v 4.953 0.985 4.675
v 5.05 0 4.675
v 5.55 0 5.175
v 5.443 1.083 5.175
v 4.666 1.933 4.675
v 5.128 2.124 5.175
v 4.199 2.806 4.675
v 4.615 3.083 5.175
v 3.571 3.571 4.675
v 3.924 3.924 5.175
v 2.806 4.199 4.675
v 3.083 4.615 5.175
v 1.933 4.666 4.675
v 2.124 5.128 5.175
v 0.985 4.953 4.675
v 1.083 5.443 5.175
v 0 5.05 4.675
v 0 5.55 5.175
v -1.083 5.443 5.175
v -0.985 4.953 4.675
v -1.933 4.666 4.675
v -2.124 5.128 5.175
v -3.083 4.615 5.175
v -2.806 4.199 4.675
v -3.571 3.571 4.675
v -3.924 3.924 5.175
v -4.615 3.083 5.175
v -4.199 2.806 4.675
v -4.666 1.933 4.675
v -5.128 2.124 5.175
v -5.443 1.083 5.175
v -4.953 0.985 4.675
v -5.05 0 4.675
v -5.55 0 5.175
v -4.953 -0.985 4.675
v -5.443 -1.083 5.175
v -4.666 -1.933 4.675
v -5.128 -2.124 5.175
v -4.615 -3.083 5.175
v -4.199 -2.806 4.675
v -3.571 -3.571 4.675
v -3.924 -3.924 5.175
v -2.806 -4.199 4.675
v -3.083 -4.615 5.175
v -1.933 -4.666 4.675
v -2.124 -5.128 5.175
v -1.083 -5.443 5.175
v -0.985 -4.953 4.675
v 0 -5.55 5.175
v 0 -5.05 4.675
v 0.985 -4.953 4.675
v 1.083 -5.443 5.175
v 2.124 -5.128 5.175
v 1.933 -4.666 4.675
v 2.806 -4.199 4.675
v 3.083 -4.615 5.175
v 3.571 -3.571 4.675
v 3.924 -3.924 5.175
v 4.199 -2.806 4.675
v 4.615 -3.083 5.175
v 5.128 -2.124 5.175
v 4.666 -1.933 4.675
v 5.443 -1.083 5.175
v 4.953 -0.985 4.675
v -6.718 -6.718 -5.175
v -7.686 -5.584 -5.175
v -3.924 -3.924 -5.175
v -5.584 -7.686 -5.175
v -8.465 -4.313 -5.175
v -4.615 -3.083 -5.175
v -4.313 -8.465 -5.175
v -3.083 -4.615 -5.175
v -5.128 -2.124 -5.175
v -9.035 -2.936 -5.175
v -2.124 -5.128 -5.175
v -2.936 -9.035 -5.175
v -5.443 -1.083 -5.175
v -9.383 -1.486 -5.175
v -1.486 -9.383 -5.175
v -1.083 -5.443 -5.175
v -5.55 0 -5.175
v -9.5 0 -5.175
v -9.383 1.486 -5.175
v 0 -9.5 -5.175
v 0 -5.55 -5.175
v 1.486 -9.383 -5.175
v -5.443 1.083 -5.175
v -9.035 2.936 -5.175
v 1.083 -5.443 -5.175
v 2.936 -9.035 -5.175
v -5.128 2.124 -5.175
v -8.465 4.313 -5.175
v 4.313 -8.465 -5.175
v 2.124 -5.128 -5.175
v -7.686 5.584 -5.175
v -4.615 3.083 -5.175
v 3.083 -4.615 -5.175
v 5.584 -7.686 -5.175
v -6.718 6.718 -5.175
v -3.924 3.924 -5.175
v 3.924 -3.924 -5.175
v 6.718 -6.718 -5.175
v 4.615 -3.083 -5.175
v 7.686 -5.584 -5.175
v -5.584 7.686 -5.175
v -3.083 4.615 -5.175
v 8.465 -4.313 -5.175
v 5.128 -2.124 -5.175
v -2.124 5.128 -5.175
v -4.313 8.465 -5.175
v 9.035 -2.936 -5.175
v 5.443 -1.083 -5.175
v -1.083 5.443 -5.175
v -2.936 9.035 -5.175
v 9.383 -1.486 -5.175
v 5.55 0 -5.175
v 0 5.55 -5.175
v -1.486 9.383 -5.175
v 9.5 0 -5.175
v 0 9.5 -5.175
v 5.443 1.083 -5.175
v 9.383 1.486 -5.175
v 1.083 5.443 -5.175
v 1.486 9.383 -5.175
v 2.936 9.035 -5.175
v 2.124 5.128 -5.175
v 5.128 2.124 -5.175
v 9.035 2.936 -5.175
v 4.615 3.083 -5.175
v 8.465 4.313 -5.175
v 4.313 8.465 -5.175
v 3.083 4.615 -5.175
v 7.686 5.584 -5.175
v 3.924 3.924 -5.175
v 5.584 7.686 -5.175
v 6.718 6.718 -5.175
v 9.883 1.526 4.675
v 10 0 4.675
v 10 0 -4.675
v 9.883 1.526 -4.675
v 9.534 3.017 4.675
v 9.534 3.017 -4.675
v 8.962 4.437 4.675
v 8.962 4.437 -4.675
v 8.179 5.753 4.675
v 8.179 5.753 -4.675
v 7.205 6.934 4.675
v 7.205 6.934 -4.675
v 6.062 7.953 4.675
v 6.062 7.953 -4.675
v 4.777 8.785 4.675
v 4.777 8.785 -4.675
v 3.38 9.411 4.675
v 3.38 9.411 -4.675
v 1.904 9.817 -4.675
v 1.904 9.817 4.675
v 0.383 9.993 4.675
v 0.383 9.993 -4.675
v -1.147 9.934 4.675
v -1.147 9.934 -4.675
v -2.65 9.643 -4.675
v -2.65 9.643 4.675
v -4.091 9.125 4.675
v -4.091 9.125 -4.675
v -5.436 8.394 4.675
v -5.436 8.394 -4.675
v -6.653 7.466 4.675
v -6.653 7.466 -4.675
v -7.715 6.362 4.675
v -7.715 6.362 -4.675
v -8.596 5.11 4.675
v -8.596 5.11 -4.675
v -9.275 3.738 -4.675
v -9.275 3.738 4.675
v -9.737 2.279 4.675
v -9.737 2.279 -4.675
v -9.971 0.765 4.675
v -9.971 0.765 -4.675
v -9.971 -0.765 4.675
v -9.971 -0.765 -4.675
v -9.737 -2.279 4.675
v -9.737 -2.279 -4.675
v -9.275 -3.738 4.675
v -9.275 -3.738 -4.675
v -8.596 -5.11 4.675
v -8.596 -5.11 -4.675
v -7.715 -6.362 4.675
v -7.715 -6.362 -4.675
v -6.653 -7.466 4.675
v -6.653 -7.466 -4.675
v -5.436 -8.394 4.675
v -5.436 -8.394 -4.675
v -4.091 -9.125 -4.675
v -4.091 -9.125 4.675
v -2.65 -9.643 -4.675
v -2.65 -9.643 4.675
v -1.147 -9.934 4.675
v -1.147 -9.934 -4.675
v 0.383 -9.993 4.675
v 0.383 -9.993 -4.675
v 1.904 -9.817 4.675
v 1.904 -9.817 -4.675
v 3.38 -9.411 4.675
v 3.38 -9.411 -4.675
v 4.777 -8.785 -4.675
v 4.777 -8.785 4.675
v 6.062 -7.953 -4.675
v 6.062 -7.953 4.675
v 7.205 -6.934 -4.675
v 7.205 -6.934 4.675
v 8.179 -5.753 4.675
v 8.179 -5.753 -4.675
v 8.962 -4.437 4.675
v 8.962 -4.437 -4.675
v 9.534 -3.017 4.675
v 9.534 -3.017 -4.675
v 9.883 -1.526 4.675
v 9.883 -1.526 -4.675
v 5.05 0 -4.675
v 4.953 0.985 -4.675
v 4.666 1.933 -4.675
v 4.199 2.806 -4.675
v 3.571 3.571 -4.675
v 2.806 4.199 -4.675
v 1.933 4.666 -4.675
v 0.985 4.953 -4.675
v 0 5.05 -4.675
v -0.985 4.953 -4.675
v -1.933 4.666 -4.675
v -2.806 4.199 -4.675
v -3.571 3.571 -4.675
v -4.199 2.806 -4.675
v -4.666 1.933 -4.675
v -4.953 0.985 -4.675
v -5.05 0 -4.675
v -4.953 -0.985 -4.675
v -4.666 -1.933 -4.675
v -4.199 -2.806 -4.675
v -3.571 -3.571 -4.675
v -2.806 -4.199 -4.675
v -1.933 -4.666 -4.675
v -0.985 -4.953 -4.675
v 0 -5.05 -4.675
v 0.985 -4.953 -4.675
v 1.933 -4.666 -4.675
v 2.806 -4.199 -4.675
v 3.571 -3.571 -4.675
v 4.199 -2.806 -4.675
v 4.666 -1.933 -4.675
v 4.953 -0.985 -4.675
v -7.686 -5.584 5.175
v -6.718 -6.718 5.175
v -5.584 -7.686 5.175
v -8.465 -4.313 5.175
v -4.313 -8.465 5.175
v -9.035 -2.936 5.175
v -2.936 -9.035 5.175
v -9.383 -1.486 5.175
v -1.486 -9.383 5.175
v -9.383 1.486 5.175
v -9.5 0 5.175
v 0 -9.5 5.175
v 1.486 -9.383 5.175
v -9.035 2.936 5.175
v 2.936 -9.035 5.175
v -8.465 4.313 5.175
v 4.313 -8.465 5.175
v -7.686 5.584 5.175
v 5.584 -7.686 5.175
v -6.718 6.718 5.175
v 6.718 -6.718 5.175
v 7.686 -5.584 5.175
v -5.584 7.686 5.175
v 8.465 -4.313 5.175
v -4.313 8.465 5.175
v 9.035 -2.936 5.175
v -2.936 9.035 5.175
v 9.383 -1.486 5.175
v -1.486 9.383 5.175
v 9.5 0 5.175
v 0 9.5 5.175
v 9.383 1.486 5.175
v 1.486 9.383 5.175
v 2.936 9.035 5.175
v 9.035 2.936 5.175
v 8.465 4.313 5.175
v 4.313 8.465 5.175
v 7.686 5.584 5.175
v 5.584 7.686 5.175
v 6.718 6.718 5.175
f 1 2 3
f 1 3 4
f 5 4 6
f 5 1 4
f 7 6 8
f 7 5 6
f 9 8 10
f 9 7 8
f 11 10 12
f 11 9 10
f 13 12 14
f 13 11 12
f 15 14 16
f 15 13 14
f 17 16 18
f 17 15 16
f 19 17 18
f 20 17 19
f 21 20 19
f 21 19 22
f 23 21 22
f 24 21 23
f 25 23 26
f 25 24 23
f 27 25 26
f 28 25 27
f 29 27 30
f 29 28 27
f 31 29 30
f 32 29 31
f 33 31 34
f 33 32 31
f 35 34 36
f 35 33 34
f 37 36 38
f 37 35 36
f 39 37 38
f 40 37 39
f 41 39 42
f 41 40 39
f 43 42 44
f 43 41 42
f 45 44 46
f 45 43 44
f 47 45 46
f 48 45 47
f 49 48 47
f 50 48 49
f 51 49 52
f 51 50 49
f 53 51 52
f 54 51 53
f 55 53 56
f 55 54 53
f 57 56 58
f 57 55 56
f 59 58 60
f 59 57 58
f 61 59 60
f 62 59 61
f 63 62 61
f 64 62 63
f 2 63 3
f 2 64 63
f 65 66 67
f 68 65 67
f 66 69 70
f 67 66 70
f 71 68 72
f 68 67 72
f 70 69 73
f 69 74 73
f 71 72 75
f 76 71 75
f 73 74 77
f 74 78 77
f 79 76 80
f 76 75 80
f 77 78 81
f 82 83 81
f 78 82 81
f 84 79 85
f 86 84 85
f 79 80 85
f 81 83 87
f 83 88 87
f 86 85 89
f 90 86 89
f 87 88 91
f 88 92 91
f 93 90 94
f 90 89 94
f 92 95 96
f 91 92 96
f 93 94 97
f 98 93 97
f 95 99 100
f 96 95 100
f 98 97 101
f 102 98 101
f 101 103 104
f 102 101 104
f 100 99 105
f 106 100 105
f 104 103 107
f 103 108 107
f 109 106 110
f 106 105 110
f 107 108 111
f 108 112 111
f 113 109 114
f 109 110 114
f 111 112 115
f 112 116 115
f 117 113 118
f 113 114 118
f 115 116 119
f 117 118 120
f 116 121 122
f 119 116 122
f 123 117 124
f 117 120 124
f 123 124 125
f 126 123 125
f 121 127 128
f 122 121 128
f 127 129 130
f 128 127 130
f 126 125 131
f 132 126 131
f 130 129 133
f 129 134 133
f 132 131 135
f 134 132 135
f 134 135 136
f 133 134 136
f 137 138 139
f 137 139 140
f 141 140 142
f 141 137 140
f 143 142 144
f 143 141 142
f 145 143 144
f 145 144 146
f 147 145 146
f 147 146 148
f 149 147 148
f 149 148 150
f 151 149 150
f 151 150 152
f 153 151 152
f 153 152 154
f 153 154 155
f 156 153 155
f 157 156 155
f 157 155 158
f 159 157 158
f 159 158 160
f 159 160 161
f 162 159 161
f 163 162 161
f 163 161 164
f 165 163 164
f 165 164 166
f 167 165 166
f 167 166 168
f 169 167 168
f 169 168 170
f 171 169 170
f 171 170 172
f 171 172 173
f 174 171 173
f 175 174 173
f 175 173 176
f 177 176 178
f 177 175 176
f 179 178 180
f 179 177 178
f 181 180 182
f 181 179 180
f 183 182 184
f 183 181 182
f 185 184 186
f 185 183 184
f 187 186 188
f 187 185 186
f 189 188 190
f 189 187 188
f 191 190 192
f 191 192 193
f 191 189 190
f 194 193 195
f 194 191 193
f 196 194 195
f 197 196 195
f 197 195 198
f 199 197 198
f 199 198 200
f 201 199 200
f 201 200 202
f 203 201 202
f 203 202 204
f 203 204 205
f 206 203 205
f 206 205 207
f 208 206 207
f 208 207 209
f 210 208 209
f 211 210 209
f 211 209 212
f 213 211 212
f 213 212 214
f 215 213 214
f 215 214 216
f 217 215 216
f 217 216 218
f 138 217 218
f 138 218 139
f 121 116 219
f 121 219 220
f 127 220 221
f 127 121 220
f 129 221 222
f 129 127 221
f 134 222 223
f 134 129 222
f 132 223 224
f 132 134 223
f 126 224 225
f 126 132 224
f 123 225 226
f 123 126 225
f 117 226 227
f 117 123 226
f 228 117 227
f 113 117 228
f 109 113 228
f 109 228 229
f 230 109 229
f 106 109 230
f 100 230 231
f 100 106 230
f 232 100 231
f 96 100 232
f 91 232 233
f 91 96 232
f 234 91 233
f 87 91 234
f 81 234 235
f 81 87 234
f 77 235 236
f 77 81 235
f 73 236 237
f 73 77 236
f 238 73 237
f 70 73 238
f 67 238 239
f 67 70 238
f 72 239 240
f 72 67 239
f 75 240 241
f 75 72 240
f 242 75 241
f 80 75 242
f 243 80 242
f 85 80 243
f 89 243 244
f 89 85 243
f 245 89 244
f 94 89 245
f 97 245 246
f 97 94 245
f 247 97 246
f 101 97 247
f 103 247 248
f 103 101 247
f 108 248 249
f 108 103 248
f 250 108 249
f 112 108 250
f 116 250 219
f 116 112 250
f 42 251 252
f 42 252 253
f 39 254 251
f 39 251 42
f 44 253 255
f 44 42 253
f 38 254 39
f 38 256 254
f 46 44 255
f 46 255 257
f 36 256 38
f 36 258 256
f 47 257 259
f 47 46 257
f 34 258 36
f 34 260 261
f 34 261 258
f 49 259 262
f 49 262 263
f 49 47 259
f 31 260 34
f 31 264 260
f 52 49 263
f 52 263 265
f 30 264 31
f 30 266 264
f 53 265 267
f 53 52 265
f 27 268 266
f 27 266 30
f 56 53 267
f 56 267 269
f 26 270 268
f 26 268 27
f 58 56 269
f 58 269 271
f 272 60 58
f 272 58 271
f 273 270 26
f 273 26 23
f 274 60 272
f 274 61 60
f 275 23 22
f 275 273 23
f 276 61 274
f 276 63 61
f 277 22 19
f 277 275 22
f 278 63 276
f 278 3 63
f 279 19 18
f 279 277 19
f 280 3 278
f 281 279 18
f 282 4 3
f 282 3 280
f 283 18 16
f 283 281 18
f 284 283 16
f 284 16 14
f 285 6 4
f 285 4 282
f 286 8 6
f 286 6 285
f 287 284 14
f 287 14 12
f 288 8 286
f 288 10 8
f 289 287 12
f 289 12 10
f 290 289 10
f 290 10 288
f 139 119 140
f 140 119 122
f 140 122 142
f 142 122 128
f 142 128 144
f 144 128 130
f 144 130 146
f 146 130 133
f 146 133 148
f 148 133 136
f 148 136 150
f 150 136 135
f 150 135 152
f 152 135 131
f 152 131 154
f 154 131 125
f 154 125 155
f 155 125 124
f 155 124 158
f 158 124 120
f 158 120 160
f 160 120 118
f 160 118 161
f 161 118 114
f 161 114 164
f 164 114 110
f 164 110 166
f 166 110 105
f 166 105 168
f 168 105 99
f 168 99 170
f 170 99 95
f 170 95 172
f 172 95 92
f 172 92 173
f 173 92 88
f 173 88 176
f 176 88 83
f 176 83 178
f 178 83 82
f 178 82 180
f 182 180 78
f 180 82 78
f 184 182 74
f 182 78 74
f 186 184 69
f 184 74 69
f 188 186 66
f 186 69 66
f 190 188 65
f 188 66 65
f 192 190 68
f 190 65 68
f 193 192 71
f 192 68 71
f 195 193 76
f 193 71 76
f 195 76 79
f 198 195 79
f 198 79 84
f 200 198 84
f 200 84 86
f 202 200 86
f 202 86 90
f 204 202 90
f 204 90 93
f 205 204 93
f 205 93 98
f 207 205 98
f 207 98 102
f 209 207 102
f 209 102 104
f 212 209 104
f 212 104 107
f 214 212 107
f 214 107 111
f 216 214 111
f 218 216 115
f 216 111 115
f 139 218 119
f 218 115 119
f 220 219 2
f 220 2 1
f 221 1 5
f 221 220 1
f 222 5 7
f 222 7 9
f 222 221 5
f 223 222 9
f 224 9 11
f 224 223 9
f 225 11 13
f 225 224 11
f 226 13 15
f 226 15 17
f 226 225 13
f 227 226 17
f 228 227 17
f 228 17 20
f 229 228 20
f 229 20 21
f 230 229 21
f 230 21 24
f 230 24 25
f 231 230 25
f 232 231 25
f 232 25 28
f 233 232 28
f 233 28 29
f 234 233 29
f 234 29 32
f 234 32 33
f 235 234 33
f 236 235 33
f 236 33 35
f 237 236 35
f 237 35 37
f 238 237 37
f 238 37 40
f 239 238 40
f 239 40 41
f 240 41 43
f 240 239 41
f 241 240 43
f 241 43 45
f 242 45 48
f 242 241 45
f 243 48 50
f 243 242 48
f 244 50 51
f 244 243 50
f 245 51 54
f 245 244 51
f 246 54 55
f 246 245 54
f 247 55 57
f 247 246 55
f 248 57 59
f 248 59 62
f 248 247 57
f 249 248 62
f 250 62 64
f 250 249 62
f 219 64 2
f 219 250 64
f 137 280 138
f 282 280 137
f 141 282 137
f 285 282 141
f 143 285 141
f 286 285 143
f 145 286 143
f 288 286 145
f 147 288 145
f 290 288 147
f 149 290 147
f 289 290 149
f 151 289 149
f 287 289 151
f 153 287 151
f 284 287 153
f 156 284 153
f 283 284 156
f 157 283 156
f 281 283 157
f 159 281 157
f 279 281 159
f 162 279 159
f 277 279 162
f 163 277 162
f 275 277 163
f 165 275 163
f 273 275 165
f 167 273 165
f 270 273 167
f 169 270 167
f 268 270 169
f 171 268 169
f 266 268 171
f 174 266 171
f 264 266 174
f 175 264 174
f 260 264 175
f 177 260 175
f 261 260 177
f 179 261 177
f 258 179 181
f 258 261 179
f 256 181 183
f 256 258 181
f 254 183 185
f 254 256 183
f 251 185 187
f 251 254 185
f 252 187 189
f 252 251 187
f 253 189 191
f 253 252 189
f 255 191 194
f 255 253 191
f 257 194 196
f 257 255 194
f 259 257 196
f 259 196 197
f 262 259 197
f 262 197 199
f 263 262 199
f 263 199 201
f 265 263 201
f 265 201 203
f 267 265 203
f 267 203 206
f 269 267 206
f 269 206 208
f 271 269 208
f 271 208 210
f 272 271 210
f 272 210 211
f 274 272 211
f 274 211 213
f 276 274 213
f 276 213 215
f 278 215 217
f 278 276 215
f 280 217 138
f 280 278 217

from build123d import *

# Parameters (mm, degrees)
ESBO_O1_R                = 10
ESBO_O1_R_2              = 5.05
RESSALTO_EXTRUS_O1_DEPTH = 5.175
CHANFRO1_SIZE            = 0.5


with BuildPart() as part:
    # Esboço1 → Ressalto-extrusão1 (new, symmetric)
    with BuildSketch(Plane.XY):
        Circle(ESBO_O1_R)
        Circle(ESBO_O1_R_2, mode=Mode.SUBTRACT)
    extrude(amount=RESSALTO_EXTRUS_O1_DEPTH, both=True)

    # Chanfro1
    chanfro1_edges = [part.edges().sort_by_distance(p)[0] for p in [
        (-10, 0, -5.175),
        (-10, 0, 5.175),
        (-5.05, 0, -5.175),
        (-5.05, 0, 5.175),
    ]]
    chamfer(chanfro1_edges, length=CHANFRO1_SIZE)


solid = part.part
